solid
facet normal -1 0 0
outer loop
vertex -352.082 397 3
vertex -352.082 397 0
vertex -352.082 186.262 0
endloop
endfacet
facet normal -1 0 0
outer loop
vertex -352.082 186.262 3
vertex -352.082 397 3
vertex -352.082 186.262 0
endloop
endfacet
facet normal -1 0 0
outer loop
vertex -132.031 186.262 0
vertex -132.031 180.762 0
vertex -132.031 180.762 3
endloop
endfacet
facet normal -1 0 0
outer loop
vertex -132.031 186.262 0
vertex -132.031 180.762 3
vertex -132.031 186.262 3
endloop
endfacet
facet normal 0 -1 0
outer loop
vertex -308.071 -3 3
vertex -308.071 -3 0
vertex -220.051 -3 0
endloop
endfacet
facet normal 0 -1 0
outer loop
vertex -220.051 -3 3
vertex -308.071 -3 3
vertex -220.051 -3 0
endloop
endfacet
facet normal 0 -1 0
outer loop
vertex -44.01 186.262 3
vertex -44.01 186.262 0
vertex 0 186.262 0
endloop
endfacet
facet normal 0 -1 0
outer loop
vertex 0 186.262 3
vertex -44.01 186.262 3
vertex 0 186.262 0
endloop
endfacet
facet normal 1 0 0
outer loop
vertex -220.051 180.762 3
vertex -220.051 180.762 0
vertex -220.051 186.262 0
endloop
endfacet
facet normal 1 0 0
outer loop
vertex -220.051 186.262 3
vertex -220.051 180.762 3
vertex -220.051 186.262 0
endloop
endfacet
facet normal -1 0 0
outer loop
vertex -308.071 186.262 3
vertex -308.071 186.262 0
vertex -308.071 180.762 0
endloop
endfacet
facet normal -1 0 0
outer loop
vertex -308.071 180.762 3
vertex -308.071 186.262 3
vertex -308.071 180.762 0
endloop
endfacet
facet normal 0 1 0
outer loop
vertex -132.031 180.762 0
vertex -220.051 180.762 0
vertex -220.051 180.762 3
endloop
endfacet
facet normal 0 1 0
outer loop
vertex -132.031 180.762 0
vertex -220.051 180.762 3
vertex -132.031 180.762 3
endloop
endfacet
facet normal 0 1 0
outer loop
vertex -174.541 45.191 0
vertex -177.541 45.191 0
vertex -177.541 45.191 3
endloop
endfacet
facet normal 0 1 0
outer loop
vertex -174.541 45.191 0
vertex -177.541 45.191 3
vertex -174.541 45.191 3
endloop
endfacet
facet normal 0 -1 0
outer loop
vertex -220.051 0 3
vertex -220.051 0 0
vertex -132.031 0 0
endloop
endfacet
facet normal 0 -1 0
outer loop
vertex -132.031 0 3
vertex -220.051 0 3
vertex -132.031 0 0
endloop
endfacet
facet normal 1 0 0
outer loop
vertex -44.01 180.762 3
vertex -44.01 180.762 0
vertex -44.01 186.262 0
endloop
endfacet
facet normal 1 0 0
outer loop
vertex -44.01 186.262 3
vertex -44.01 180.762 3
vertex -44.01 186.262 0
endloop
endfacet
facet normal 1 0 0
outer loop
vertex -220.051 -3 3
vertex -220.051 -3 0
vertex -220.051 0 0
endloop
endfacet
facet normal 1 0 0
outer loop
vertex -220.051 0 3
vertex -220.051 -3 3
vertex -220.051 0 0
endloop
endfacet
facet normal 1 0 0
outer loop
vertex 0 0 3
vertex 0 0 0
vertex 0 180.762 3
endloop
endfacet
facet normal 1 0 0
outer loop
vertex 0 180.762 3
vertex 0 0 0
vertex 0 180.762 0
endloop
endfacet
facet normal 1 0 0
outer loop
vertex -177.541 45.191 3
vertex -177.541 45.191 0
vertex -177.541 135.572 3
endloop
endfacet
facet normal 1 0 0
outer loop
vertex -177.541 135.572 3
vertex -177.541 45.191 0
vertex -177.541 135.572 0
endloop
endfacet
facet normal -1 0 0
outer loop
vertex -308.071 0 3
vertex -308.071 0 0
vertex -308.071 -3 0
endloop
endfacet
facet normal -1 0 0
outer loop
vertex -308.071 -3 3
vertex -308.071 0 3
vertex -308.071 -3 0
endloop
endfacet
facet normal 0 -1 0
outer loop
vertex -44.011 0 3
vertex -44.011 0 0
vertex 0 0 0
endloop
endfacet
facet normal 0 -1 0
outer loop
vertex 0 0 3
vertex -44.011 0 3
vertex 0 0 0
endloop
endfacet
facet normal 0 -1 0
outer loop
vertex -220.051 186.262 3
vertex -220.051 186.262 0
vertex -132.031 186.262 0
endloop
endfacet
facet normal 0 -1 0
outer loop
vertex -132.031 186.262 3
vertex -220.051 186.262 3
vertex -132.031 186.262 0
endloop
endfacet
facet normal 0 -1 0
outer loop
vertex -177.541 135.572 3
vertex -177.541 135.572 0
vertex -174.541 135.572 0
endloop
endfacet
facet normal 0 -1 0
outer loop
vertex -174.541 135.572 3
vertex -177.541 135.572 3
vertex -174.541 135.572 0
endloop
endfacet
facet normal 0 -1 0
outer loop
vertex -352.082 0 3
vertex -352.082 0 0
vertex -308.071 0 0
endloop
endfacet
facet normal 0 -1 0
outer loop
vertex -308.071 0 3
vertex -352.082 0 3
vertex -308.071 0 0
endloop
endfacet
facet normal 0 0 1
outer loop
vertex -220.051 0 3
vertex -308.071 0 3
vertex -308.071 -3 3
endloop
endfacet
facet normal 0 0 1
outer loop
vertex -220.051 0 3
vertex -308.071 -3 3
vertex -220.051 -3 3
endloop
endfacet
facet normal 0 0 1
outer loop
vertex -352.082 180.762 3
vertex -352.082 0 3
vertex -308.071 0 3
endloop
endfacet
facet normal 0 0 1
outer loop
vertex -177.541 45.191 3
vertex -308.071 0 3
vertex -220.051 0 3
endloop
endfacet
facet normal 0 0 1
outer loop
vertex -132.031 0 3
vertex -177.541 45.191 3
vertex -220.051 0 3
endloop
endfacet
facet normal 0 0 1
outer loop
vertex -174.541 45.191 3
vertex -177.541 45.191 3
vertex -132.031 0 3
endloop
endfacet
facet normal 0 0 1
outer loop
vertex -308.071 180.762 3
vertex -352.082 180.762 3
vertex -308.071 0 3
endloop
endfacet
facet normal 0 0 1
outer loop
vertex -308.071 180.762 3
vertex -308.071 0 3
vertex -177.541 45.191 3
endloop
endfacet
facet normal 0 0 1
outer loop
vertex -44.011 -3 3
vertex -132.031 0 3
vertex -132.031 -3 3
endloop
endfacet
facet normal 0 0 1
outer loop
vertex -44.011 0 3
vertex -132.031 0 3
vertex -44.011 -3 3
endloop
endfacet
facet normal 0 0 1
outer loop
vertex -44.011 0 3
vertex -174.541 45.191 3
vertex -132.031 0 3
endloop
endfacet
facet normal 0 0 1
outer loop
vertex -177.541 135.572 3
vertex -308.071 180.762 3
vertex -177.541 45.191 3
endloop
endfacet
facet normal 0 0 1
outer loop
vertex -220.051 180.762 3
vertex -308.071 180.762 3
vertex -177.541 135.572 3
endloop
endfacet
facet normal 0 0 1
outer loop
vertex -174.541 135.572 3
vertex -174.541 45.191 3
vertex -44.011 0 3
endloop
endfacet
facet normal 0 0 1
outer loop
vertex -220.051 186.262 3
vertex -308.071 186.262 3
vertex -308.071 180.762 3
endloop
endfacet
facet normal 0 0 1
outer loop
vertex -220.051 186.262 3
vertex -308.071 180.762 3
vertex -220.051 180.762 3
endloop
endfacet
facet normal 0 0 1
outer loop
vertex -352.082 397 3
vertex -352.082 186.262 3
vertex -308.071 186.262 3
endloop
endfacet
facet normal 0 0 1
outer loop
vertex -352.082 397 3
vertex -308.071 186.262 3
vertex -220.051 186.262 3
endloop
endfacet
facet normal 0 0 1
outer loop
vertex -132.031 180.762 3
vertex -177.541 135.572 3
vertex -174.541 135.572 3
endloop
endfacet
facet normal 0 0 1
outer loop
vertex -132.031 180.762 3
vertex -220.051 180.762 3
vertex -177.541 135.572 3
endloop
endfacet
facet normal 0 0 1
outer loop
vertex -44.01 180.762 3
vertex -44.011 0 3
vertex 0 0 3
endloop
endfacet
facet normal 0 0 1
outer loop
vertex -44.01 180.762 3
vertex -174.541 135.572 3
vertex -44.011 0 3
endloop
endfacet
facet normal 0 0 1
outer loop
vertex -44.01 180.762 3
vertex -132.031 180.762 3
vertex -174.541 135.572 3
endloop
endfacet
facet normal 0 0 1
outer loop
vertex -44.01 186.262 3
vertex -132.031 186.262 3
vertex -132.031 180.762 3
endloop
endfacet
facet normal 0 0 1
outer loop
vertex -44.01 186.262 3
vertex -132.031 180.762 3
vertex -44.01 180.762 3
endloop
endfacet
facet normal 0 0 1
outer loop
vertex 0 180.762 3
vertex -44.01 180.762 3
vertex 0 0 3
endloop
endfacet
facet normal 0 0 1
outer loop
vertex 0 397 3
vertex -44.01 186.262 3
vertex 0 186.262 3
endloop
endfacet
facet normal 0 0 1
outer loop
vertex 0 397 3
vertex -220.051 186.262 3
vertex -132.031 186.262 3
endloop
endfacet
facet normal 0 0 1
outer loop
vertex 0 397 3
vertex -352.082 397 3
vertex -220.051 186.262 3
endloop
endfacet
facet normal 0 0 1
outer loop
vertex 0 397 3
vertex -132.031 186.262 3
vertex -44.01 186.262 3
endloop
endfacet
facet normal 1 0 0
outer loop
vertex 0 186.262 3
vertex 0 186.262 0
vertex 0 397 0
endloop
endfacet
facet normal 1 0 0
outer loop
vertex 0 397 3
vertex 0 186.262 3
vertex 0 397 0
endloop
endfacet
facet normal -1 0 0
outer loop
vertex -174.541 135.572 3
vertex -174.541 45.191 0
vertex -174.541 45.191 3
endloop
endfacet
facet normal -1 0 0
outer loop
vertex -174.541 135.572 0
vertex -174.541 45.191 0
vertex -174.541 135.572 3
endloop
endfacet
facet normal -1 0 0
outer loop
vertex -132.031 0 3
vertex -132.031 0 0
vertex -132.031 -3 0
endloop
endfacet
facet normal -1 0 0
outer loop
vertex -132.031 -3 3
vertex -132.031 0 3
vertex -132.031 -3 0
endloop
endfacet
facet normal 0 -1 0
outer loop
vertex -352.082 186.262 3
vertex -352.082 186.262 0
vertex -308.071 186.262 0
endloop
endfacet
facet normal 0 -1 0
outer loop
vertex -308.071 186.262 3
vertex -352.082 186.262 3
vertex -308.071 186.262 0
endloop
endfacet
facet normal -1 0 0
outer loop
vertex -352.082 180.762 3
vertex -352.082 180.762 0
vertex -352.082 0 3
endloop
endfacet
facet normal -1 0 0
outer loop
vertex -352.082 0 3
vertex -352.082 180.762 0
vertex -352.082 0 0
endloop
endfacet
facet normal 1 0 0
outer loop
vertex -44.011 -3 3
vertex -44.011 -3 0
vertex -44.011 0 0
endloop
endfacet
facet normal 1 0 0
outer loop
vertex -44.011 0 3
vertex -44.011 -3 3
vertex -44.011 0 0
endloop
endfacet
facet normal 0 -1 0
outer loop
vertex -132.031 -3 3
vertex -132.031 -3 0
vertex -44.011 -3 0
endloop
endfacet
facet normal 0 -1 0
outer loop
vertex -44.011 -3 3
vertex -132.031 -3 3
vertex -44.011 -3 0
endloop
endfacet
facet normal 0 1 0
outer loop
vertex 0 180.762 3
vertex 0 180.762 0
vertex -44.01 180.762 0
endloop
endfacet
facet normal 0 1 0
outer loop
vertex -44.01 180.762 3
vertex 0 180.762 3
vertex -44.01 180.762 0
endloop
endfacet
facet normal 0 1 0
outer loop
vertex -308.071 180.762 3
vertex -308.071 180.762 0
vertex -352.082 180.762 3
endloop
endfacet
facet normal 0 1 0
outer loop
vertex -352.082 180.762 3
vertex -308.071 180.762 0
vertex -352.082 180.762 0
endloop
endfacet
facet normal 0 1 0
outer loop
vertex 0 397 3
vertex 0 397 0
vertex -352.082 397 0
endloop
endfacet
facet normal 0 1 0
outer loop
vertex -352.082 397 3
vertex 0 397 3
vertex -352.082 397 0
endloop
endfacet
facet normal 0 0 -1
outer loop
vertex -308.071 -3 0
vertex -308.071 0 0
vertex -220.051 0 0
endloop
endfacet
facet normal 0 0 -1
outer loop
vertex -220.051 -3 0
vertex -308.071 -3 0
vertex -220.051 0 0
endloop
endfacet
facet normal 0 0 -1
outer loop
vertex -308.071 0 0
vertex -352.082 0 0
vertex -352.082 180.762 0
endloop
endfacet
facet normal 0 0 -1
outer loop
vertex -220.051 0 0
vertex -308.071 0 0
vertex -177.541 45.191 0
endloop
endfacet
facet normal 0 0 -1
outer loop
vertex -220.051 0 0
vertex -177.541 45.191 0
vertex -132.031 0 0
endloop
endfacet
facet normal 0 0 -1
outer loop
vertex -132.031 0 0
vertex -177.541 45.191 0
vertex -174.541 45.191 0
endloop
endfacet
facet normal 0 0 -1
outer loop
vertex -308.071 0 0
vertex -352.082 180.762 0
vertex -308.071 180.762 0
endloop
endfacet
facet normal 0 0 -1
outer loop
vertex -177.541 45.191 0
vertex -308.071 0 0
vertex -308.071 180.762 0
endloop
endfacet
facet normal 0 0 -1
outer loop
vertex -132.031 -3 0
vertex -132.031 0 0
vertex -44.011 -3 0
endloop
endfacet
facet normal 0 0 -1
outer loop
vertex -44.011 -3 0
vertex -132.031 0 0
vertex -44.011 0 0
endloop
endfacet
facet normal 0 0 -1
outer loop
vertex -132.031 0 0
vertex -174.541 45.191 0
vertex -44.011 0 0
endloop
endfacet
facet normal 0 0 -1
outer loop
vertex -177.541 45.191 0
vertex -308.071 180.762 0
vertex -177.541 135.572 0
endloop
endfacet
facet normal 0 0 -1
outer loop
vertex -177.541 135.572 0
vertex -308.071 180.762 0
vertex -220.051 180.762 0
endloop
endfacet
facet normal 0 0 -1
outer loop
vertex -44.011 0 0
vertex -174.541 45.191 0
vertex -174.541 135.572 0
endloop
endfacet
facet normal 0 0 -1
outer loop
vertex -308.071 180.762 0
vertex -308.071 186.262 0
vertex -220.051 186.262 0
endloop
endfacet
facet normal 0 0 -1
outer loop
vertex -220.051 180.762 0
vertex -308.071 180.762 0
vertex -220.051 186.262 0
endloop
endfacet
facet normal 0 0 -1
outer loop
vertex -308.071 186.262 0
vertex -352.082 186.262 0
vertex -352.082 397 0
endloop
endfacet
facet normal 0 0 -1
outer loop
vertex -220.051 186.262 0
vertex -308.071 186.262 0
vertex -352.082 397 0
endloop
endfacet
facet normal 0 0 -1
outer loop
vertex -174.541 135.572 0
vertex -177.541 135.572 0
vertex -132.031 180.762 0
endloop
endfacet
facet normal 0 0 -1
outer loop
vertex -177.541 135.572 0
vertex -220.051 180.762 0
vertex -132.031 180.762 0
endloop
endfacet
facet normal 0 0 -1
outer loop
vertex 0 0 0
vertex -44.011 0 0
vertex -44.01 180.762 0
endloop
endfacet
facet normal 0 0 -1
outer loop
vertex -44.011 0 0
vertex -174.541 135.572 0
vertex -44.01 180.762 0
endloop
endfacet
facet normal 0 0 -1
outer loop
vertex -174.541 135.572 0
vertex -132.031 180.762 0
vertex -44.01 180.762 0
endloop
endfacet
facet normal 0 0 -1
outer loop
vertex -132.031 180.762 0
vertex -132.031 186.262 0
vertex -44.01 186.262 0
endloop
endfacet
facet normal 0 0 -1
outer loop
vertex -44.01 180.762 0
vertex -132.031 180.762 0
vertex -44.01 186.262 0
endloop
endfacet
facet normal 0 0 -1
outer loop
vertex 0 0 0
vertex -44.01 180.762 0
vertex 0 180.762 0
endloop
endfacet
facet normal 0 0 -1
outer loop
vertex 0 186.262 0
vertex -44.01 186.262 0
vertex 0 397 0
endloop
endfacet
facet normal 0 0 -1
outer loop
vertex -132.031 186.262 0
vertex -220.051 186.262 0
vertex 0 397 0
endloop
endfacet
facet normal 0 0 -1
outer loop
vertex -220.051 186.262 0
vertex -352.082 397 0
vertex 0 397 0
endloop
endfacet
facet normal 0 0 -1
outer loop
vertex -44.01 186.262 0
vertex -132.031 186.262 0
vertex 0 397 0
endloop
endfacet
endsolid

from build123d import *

# Parameters (mm, degrees)
ESBO_O1_W                = 88.020382005
ESBO_O1_H                = 5.5
ESBO_O1_W_2              = 3
ESBO_O1_H_2              = 90.38122327
RESSALTO_EXTRUS_O1_DEPTH = 3


with BuildPart() as part:
    # Esboço1 → Ressalto-extrusão1 (new body)
    with BuildSketch(Plane.XY):
        Polygon((-308.071337018, 0), (-308.071337018, -3), (-220.050955012, -3), (-220.050955012, 0), (-132.031337017, 0), (-132.031337017, -3), (-44.010955012, -3), (-44.010955012, 0), (0, 0), (0, 180.76244654), (-44.010191002, 180.76244654), (-44.010191002, 186.26244654), (0, 186.26244654), (0, 397), (-352.08152802, 397), (-352.08152802, 186.26244654), (-308.071337018, 186.26244654), (-308.071337017, 180.76244654), (-352.08152802, 180.76244654), (-352.08152802, 0), align=None)
        with Locations((-176.04076401, 183.51244654)):
            Rectangle(ESBO_O1_W, ESBO_O1_H, mode=Mode.SUBTRACT)
        with Locations((-176.04076401, 90.38122327)):
            Rectangle(ESBO_O1_W_2, ESBO_O1_H_2, mode=Mode.SUBTRACT)
    extrude(amount=RESSALTO_EXTRUS_O1_DEPTH)


solid = part.part
